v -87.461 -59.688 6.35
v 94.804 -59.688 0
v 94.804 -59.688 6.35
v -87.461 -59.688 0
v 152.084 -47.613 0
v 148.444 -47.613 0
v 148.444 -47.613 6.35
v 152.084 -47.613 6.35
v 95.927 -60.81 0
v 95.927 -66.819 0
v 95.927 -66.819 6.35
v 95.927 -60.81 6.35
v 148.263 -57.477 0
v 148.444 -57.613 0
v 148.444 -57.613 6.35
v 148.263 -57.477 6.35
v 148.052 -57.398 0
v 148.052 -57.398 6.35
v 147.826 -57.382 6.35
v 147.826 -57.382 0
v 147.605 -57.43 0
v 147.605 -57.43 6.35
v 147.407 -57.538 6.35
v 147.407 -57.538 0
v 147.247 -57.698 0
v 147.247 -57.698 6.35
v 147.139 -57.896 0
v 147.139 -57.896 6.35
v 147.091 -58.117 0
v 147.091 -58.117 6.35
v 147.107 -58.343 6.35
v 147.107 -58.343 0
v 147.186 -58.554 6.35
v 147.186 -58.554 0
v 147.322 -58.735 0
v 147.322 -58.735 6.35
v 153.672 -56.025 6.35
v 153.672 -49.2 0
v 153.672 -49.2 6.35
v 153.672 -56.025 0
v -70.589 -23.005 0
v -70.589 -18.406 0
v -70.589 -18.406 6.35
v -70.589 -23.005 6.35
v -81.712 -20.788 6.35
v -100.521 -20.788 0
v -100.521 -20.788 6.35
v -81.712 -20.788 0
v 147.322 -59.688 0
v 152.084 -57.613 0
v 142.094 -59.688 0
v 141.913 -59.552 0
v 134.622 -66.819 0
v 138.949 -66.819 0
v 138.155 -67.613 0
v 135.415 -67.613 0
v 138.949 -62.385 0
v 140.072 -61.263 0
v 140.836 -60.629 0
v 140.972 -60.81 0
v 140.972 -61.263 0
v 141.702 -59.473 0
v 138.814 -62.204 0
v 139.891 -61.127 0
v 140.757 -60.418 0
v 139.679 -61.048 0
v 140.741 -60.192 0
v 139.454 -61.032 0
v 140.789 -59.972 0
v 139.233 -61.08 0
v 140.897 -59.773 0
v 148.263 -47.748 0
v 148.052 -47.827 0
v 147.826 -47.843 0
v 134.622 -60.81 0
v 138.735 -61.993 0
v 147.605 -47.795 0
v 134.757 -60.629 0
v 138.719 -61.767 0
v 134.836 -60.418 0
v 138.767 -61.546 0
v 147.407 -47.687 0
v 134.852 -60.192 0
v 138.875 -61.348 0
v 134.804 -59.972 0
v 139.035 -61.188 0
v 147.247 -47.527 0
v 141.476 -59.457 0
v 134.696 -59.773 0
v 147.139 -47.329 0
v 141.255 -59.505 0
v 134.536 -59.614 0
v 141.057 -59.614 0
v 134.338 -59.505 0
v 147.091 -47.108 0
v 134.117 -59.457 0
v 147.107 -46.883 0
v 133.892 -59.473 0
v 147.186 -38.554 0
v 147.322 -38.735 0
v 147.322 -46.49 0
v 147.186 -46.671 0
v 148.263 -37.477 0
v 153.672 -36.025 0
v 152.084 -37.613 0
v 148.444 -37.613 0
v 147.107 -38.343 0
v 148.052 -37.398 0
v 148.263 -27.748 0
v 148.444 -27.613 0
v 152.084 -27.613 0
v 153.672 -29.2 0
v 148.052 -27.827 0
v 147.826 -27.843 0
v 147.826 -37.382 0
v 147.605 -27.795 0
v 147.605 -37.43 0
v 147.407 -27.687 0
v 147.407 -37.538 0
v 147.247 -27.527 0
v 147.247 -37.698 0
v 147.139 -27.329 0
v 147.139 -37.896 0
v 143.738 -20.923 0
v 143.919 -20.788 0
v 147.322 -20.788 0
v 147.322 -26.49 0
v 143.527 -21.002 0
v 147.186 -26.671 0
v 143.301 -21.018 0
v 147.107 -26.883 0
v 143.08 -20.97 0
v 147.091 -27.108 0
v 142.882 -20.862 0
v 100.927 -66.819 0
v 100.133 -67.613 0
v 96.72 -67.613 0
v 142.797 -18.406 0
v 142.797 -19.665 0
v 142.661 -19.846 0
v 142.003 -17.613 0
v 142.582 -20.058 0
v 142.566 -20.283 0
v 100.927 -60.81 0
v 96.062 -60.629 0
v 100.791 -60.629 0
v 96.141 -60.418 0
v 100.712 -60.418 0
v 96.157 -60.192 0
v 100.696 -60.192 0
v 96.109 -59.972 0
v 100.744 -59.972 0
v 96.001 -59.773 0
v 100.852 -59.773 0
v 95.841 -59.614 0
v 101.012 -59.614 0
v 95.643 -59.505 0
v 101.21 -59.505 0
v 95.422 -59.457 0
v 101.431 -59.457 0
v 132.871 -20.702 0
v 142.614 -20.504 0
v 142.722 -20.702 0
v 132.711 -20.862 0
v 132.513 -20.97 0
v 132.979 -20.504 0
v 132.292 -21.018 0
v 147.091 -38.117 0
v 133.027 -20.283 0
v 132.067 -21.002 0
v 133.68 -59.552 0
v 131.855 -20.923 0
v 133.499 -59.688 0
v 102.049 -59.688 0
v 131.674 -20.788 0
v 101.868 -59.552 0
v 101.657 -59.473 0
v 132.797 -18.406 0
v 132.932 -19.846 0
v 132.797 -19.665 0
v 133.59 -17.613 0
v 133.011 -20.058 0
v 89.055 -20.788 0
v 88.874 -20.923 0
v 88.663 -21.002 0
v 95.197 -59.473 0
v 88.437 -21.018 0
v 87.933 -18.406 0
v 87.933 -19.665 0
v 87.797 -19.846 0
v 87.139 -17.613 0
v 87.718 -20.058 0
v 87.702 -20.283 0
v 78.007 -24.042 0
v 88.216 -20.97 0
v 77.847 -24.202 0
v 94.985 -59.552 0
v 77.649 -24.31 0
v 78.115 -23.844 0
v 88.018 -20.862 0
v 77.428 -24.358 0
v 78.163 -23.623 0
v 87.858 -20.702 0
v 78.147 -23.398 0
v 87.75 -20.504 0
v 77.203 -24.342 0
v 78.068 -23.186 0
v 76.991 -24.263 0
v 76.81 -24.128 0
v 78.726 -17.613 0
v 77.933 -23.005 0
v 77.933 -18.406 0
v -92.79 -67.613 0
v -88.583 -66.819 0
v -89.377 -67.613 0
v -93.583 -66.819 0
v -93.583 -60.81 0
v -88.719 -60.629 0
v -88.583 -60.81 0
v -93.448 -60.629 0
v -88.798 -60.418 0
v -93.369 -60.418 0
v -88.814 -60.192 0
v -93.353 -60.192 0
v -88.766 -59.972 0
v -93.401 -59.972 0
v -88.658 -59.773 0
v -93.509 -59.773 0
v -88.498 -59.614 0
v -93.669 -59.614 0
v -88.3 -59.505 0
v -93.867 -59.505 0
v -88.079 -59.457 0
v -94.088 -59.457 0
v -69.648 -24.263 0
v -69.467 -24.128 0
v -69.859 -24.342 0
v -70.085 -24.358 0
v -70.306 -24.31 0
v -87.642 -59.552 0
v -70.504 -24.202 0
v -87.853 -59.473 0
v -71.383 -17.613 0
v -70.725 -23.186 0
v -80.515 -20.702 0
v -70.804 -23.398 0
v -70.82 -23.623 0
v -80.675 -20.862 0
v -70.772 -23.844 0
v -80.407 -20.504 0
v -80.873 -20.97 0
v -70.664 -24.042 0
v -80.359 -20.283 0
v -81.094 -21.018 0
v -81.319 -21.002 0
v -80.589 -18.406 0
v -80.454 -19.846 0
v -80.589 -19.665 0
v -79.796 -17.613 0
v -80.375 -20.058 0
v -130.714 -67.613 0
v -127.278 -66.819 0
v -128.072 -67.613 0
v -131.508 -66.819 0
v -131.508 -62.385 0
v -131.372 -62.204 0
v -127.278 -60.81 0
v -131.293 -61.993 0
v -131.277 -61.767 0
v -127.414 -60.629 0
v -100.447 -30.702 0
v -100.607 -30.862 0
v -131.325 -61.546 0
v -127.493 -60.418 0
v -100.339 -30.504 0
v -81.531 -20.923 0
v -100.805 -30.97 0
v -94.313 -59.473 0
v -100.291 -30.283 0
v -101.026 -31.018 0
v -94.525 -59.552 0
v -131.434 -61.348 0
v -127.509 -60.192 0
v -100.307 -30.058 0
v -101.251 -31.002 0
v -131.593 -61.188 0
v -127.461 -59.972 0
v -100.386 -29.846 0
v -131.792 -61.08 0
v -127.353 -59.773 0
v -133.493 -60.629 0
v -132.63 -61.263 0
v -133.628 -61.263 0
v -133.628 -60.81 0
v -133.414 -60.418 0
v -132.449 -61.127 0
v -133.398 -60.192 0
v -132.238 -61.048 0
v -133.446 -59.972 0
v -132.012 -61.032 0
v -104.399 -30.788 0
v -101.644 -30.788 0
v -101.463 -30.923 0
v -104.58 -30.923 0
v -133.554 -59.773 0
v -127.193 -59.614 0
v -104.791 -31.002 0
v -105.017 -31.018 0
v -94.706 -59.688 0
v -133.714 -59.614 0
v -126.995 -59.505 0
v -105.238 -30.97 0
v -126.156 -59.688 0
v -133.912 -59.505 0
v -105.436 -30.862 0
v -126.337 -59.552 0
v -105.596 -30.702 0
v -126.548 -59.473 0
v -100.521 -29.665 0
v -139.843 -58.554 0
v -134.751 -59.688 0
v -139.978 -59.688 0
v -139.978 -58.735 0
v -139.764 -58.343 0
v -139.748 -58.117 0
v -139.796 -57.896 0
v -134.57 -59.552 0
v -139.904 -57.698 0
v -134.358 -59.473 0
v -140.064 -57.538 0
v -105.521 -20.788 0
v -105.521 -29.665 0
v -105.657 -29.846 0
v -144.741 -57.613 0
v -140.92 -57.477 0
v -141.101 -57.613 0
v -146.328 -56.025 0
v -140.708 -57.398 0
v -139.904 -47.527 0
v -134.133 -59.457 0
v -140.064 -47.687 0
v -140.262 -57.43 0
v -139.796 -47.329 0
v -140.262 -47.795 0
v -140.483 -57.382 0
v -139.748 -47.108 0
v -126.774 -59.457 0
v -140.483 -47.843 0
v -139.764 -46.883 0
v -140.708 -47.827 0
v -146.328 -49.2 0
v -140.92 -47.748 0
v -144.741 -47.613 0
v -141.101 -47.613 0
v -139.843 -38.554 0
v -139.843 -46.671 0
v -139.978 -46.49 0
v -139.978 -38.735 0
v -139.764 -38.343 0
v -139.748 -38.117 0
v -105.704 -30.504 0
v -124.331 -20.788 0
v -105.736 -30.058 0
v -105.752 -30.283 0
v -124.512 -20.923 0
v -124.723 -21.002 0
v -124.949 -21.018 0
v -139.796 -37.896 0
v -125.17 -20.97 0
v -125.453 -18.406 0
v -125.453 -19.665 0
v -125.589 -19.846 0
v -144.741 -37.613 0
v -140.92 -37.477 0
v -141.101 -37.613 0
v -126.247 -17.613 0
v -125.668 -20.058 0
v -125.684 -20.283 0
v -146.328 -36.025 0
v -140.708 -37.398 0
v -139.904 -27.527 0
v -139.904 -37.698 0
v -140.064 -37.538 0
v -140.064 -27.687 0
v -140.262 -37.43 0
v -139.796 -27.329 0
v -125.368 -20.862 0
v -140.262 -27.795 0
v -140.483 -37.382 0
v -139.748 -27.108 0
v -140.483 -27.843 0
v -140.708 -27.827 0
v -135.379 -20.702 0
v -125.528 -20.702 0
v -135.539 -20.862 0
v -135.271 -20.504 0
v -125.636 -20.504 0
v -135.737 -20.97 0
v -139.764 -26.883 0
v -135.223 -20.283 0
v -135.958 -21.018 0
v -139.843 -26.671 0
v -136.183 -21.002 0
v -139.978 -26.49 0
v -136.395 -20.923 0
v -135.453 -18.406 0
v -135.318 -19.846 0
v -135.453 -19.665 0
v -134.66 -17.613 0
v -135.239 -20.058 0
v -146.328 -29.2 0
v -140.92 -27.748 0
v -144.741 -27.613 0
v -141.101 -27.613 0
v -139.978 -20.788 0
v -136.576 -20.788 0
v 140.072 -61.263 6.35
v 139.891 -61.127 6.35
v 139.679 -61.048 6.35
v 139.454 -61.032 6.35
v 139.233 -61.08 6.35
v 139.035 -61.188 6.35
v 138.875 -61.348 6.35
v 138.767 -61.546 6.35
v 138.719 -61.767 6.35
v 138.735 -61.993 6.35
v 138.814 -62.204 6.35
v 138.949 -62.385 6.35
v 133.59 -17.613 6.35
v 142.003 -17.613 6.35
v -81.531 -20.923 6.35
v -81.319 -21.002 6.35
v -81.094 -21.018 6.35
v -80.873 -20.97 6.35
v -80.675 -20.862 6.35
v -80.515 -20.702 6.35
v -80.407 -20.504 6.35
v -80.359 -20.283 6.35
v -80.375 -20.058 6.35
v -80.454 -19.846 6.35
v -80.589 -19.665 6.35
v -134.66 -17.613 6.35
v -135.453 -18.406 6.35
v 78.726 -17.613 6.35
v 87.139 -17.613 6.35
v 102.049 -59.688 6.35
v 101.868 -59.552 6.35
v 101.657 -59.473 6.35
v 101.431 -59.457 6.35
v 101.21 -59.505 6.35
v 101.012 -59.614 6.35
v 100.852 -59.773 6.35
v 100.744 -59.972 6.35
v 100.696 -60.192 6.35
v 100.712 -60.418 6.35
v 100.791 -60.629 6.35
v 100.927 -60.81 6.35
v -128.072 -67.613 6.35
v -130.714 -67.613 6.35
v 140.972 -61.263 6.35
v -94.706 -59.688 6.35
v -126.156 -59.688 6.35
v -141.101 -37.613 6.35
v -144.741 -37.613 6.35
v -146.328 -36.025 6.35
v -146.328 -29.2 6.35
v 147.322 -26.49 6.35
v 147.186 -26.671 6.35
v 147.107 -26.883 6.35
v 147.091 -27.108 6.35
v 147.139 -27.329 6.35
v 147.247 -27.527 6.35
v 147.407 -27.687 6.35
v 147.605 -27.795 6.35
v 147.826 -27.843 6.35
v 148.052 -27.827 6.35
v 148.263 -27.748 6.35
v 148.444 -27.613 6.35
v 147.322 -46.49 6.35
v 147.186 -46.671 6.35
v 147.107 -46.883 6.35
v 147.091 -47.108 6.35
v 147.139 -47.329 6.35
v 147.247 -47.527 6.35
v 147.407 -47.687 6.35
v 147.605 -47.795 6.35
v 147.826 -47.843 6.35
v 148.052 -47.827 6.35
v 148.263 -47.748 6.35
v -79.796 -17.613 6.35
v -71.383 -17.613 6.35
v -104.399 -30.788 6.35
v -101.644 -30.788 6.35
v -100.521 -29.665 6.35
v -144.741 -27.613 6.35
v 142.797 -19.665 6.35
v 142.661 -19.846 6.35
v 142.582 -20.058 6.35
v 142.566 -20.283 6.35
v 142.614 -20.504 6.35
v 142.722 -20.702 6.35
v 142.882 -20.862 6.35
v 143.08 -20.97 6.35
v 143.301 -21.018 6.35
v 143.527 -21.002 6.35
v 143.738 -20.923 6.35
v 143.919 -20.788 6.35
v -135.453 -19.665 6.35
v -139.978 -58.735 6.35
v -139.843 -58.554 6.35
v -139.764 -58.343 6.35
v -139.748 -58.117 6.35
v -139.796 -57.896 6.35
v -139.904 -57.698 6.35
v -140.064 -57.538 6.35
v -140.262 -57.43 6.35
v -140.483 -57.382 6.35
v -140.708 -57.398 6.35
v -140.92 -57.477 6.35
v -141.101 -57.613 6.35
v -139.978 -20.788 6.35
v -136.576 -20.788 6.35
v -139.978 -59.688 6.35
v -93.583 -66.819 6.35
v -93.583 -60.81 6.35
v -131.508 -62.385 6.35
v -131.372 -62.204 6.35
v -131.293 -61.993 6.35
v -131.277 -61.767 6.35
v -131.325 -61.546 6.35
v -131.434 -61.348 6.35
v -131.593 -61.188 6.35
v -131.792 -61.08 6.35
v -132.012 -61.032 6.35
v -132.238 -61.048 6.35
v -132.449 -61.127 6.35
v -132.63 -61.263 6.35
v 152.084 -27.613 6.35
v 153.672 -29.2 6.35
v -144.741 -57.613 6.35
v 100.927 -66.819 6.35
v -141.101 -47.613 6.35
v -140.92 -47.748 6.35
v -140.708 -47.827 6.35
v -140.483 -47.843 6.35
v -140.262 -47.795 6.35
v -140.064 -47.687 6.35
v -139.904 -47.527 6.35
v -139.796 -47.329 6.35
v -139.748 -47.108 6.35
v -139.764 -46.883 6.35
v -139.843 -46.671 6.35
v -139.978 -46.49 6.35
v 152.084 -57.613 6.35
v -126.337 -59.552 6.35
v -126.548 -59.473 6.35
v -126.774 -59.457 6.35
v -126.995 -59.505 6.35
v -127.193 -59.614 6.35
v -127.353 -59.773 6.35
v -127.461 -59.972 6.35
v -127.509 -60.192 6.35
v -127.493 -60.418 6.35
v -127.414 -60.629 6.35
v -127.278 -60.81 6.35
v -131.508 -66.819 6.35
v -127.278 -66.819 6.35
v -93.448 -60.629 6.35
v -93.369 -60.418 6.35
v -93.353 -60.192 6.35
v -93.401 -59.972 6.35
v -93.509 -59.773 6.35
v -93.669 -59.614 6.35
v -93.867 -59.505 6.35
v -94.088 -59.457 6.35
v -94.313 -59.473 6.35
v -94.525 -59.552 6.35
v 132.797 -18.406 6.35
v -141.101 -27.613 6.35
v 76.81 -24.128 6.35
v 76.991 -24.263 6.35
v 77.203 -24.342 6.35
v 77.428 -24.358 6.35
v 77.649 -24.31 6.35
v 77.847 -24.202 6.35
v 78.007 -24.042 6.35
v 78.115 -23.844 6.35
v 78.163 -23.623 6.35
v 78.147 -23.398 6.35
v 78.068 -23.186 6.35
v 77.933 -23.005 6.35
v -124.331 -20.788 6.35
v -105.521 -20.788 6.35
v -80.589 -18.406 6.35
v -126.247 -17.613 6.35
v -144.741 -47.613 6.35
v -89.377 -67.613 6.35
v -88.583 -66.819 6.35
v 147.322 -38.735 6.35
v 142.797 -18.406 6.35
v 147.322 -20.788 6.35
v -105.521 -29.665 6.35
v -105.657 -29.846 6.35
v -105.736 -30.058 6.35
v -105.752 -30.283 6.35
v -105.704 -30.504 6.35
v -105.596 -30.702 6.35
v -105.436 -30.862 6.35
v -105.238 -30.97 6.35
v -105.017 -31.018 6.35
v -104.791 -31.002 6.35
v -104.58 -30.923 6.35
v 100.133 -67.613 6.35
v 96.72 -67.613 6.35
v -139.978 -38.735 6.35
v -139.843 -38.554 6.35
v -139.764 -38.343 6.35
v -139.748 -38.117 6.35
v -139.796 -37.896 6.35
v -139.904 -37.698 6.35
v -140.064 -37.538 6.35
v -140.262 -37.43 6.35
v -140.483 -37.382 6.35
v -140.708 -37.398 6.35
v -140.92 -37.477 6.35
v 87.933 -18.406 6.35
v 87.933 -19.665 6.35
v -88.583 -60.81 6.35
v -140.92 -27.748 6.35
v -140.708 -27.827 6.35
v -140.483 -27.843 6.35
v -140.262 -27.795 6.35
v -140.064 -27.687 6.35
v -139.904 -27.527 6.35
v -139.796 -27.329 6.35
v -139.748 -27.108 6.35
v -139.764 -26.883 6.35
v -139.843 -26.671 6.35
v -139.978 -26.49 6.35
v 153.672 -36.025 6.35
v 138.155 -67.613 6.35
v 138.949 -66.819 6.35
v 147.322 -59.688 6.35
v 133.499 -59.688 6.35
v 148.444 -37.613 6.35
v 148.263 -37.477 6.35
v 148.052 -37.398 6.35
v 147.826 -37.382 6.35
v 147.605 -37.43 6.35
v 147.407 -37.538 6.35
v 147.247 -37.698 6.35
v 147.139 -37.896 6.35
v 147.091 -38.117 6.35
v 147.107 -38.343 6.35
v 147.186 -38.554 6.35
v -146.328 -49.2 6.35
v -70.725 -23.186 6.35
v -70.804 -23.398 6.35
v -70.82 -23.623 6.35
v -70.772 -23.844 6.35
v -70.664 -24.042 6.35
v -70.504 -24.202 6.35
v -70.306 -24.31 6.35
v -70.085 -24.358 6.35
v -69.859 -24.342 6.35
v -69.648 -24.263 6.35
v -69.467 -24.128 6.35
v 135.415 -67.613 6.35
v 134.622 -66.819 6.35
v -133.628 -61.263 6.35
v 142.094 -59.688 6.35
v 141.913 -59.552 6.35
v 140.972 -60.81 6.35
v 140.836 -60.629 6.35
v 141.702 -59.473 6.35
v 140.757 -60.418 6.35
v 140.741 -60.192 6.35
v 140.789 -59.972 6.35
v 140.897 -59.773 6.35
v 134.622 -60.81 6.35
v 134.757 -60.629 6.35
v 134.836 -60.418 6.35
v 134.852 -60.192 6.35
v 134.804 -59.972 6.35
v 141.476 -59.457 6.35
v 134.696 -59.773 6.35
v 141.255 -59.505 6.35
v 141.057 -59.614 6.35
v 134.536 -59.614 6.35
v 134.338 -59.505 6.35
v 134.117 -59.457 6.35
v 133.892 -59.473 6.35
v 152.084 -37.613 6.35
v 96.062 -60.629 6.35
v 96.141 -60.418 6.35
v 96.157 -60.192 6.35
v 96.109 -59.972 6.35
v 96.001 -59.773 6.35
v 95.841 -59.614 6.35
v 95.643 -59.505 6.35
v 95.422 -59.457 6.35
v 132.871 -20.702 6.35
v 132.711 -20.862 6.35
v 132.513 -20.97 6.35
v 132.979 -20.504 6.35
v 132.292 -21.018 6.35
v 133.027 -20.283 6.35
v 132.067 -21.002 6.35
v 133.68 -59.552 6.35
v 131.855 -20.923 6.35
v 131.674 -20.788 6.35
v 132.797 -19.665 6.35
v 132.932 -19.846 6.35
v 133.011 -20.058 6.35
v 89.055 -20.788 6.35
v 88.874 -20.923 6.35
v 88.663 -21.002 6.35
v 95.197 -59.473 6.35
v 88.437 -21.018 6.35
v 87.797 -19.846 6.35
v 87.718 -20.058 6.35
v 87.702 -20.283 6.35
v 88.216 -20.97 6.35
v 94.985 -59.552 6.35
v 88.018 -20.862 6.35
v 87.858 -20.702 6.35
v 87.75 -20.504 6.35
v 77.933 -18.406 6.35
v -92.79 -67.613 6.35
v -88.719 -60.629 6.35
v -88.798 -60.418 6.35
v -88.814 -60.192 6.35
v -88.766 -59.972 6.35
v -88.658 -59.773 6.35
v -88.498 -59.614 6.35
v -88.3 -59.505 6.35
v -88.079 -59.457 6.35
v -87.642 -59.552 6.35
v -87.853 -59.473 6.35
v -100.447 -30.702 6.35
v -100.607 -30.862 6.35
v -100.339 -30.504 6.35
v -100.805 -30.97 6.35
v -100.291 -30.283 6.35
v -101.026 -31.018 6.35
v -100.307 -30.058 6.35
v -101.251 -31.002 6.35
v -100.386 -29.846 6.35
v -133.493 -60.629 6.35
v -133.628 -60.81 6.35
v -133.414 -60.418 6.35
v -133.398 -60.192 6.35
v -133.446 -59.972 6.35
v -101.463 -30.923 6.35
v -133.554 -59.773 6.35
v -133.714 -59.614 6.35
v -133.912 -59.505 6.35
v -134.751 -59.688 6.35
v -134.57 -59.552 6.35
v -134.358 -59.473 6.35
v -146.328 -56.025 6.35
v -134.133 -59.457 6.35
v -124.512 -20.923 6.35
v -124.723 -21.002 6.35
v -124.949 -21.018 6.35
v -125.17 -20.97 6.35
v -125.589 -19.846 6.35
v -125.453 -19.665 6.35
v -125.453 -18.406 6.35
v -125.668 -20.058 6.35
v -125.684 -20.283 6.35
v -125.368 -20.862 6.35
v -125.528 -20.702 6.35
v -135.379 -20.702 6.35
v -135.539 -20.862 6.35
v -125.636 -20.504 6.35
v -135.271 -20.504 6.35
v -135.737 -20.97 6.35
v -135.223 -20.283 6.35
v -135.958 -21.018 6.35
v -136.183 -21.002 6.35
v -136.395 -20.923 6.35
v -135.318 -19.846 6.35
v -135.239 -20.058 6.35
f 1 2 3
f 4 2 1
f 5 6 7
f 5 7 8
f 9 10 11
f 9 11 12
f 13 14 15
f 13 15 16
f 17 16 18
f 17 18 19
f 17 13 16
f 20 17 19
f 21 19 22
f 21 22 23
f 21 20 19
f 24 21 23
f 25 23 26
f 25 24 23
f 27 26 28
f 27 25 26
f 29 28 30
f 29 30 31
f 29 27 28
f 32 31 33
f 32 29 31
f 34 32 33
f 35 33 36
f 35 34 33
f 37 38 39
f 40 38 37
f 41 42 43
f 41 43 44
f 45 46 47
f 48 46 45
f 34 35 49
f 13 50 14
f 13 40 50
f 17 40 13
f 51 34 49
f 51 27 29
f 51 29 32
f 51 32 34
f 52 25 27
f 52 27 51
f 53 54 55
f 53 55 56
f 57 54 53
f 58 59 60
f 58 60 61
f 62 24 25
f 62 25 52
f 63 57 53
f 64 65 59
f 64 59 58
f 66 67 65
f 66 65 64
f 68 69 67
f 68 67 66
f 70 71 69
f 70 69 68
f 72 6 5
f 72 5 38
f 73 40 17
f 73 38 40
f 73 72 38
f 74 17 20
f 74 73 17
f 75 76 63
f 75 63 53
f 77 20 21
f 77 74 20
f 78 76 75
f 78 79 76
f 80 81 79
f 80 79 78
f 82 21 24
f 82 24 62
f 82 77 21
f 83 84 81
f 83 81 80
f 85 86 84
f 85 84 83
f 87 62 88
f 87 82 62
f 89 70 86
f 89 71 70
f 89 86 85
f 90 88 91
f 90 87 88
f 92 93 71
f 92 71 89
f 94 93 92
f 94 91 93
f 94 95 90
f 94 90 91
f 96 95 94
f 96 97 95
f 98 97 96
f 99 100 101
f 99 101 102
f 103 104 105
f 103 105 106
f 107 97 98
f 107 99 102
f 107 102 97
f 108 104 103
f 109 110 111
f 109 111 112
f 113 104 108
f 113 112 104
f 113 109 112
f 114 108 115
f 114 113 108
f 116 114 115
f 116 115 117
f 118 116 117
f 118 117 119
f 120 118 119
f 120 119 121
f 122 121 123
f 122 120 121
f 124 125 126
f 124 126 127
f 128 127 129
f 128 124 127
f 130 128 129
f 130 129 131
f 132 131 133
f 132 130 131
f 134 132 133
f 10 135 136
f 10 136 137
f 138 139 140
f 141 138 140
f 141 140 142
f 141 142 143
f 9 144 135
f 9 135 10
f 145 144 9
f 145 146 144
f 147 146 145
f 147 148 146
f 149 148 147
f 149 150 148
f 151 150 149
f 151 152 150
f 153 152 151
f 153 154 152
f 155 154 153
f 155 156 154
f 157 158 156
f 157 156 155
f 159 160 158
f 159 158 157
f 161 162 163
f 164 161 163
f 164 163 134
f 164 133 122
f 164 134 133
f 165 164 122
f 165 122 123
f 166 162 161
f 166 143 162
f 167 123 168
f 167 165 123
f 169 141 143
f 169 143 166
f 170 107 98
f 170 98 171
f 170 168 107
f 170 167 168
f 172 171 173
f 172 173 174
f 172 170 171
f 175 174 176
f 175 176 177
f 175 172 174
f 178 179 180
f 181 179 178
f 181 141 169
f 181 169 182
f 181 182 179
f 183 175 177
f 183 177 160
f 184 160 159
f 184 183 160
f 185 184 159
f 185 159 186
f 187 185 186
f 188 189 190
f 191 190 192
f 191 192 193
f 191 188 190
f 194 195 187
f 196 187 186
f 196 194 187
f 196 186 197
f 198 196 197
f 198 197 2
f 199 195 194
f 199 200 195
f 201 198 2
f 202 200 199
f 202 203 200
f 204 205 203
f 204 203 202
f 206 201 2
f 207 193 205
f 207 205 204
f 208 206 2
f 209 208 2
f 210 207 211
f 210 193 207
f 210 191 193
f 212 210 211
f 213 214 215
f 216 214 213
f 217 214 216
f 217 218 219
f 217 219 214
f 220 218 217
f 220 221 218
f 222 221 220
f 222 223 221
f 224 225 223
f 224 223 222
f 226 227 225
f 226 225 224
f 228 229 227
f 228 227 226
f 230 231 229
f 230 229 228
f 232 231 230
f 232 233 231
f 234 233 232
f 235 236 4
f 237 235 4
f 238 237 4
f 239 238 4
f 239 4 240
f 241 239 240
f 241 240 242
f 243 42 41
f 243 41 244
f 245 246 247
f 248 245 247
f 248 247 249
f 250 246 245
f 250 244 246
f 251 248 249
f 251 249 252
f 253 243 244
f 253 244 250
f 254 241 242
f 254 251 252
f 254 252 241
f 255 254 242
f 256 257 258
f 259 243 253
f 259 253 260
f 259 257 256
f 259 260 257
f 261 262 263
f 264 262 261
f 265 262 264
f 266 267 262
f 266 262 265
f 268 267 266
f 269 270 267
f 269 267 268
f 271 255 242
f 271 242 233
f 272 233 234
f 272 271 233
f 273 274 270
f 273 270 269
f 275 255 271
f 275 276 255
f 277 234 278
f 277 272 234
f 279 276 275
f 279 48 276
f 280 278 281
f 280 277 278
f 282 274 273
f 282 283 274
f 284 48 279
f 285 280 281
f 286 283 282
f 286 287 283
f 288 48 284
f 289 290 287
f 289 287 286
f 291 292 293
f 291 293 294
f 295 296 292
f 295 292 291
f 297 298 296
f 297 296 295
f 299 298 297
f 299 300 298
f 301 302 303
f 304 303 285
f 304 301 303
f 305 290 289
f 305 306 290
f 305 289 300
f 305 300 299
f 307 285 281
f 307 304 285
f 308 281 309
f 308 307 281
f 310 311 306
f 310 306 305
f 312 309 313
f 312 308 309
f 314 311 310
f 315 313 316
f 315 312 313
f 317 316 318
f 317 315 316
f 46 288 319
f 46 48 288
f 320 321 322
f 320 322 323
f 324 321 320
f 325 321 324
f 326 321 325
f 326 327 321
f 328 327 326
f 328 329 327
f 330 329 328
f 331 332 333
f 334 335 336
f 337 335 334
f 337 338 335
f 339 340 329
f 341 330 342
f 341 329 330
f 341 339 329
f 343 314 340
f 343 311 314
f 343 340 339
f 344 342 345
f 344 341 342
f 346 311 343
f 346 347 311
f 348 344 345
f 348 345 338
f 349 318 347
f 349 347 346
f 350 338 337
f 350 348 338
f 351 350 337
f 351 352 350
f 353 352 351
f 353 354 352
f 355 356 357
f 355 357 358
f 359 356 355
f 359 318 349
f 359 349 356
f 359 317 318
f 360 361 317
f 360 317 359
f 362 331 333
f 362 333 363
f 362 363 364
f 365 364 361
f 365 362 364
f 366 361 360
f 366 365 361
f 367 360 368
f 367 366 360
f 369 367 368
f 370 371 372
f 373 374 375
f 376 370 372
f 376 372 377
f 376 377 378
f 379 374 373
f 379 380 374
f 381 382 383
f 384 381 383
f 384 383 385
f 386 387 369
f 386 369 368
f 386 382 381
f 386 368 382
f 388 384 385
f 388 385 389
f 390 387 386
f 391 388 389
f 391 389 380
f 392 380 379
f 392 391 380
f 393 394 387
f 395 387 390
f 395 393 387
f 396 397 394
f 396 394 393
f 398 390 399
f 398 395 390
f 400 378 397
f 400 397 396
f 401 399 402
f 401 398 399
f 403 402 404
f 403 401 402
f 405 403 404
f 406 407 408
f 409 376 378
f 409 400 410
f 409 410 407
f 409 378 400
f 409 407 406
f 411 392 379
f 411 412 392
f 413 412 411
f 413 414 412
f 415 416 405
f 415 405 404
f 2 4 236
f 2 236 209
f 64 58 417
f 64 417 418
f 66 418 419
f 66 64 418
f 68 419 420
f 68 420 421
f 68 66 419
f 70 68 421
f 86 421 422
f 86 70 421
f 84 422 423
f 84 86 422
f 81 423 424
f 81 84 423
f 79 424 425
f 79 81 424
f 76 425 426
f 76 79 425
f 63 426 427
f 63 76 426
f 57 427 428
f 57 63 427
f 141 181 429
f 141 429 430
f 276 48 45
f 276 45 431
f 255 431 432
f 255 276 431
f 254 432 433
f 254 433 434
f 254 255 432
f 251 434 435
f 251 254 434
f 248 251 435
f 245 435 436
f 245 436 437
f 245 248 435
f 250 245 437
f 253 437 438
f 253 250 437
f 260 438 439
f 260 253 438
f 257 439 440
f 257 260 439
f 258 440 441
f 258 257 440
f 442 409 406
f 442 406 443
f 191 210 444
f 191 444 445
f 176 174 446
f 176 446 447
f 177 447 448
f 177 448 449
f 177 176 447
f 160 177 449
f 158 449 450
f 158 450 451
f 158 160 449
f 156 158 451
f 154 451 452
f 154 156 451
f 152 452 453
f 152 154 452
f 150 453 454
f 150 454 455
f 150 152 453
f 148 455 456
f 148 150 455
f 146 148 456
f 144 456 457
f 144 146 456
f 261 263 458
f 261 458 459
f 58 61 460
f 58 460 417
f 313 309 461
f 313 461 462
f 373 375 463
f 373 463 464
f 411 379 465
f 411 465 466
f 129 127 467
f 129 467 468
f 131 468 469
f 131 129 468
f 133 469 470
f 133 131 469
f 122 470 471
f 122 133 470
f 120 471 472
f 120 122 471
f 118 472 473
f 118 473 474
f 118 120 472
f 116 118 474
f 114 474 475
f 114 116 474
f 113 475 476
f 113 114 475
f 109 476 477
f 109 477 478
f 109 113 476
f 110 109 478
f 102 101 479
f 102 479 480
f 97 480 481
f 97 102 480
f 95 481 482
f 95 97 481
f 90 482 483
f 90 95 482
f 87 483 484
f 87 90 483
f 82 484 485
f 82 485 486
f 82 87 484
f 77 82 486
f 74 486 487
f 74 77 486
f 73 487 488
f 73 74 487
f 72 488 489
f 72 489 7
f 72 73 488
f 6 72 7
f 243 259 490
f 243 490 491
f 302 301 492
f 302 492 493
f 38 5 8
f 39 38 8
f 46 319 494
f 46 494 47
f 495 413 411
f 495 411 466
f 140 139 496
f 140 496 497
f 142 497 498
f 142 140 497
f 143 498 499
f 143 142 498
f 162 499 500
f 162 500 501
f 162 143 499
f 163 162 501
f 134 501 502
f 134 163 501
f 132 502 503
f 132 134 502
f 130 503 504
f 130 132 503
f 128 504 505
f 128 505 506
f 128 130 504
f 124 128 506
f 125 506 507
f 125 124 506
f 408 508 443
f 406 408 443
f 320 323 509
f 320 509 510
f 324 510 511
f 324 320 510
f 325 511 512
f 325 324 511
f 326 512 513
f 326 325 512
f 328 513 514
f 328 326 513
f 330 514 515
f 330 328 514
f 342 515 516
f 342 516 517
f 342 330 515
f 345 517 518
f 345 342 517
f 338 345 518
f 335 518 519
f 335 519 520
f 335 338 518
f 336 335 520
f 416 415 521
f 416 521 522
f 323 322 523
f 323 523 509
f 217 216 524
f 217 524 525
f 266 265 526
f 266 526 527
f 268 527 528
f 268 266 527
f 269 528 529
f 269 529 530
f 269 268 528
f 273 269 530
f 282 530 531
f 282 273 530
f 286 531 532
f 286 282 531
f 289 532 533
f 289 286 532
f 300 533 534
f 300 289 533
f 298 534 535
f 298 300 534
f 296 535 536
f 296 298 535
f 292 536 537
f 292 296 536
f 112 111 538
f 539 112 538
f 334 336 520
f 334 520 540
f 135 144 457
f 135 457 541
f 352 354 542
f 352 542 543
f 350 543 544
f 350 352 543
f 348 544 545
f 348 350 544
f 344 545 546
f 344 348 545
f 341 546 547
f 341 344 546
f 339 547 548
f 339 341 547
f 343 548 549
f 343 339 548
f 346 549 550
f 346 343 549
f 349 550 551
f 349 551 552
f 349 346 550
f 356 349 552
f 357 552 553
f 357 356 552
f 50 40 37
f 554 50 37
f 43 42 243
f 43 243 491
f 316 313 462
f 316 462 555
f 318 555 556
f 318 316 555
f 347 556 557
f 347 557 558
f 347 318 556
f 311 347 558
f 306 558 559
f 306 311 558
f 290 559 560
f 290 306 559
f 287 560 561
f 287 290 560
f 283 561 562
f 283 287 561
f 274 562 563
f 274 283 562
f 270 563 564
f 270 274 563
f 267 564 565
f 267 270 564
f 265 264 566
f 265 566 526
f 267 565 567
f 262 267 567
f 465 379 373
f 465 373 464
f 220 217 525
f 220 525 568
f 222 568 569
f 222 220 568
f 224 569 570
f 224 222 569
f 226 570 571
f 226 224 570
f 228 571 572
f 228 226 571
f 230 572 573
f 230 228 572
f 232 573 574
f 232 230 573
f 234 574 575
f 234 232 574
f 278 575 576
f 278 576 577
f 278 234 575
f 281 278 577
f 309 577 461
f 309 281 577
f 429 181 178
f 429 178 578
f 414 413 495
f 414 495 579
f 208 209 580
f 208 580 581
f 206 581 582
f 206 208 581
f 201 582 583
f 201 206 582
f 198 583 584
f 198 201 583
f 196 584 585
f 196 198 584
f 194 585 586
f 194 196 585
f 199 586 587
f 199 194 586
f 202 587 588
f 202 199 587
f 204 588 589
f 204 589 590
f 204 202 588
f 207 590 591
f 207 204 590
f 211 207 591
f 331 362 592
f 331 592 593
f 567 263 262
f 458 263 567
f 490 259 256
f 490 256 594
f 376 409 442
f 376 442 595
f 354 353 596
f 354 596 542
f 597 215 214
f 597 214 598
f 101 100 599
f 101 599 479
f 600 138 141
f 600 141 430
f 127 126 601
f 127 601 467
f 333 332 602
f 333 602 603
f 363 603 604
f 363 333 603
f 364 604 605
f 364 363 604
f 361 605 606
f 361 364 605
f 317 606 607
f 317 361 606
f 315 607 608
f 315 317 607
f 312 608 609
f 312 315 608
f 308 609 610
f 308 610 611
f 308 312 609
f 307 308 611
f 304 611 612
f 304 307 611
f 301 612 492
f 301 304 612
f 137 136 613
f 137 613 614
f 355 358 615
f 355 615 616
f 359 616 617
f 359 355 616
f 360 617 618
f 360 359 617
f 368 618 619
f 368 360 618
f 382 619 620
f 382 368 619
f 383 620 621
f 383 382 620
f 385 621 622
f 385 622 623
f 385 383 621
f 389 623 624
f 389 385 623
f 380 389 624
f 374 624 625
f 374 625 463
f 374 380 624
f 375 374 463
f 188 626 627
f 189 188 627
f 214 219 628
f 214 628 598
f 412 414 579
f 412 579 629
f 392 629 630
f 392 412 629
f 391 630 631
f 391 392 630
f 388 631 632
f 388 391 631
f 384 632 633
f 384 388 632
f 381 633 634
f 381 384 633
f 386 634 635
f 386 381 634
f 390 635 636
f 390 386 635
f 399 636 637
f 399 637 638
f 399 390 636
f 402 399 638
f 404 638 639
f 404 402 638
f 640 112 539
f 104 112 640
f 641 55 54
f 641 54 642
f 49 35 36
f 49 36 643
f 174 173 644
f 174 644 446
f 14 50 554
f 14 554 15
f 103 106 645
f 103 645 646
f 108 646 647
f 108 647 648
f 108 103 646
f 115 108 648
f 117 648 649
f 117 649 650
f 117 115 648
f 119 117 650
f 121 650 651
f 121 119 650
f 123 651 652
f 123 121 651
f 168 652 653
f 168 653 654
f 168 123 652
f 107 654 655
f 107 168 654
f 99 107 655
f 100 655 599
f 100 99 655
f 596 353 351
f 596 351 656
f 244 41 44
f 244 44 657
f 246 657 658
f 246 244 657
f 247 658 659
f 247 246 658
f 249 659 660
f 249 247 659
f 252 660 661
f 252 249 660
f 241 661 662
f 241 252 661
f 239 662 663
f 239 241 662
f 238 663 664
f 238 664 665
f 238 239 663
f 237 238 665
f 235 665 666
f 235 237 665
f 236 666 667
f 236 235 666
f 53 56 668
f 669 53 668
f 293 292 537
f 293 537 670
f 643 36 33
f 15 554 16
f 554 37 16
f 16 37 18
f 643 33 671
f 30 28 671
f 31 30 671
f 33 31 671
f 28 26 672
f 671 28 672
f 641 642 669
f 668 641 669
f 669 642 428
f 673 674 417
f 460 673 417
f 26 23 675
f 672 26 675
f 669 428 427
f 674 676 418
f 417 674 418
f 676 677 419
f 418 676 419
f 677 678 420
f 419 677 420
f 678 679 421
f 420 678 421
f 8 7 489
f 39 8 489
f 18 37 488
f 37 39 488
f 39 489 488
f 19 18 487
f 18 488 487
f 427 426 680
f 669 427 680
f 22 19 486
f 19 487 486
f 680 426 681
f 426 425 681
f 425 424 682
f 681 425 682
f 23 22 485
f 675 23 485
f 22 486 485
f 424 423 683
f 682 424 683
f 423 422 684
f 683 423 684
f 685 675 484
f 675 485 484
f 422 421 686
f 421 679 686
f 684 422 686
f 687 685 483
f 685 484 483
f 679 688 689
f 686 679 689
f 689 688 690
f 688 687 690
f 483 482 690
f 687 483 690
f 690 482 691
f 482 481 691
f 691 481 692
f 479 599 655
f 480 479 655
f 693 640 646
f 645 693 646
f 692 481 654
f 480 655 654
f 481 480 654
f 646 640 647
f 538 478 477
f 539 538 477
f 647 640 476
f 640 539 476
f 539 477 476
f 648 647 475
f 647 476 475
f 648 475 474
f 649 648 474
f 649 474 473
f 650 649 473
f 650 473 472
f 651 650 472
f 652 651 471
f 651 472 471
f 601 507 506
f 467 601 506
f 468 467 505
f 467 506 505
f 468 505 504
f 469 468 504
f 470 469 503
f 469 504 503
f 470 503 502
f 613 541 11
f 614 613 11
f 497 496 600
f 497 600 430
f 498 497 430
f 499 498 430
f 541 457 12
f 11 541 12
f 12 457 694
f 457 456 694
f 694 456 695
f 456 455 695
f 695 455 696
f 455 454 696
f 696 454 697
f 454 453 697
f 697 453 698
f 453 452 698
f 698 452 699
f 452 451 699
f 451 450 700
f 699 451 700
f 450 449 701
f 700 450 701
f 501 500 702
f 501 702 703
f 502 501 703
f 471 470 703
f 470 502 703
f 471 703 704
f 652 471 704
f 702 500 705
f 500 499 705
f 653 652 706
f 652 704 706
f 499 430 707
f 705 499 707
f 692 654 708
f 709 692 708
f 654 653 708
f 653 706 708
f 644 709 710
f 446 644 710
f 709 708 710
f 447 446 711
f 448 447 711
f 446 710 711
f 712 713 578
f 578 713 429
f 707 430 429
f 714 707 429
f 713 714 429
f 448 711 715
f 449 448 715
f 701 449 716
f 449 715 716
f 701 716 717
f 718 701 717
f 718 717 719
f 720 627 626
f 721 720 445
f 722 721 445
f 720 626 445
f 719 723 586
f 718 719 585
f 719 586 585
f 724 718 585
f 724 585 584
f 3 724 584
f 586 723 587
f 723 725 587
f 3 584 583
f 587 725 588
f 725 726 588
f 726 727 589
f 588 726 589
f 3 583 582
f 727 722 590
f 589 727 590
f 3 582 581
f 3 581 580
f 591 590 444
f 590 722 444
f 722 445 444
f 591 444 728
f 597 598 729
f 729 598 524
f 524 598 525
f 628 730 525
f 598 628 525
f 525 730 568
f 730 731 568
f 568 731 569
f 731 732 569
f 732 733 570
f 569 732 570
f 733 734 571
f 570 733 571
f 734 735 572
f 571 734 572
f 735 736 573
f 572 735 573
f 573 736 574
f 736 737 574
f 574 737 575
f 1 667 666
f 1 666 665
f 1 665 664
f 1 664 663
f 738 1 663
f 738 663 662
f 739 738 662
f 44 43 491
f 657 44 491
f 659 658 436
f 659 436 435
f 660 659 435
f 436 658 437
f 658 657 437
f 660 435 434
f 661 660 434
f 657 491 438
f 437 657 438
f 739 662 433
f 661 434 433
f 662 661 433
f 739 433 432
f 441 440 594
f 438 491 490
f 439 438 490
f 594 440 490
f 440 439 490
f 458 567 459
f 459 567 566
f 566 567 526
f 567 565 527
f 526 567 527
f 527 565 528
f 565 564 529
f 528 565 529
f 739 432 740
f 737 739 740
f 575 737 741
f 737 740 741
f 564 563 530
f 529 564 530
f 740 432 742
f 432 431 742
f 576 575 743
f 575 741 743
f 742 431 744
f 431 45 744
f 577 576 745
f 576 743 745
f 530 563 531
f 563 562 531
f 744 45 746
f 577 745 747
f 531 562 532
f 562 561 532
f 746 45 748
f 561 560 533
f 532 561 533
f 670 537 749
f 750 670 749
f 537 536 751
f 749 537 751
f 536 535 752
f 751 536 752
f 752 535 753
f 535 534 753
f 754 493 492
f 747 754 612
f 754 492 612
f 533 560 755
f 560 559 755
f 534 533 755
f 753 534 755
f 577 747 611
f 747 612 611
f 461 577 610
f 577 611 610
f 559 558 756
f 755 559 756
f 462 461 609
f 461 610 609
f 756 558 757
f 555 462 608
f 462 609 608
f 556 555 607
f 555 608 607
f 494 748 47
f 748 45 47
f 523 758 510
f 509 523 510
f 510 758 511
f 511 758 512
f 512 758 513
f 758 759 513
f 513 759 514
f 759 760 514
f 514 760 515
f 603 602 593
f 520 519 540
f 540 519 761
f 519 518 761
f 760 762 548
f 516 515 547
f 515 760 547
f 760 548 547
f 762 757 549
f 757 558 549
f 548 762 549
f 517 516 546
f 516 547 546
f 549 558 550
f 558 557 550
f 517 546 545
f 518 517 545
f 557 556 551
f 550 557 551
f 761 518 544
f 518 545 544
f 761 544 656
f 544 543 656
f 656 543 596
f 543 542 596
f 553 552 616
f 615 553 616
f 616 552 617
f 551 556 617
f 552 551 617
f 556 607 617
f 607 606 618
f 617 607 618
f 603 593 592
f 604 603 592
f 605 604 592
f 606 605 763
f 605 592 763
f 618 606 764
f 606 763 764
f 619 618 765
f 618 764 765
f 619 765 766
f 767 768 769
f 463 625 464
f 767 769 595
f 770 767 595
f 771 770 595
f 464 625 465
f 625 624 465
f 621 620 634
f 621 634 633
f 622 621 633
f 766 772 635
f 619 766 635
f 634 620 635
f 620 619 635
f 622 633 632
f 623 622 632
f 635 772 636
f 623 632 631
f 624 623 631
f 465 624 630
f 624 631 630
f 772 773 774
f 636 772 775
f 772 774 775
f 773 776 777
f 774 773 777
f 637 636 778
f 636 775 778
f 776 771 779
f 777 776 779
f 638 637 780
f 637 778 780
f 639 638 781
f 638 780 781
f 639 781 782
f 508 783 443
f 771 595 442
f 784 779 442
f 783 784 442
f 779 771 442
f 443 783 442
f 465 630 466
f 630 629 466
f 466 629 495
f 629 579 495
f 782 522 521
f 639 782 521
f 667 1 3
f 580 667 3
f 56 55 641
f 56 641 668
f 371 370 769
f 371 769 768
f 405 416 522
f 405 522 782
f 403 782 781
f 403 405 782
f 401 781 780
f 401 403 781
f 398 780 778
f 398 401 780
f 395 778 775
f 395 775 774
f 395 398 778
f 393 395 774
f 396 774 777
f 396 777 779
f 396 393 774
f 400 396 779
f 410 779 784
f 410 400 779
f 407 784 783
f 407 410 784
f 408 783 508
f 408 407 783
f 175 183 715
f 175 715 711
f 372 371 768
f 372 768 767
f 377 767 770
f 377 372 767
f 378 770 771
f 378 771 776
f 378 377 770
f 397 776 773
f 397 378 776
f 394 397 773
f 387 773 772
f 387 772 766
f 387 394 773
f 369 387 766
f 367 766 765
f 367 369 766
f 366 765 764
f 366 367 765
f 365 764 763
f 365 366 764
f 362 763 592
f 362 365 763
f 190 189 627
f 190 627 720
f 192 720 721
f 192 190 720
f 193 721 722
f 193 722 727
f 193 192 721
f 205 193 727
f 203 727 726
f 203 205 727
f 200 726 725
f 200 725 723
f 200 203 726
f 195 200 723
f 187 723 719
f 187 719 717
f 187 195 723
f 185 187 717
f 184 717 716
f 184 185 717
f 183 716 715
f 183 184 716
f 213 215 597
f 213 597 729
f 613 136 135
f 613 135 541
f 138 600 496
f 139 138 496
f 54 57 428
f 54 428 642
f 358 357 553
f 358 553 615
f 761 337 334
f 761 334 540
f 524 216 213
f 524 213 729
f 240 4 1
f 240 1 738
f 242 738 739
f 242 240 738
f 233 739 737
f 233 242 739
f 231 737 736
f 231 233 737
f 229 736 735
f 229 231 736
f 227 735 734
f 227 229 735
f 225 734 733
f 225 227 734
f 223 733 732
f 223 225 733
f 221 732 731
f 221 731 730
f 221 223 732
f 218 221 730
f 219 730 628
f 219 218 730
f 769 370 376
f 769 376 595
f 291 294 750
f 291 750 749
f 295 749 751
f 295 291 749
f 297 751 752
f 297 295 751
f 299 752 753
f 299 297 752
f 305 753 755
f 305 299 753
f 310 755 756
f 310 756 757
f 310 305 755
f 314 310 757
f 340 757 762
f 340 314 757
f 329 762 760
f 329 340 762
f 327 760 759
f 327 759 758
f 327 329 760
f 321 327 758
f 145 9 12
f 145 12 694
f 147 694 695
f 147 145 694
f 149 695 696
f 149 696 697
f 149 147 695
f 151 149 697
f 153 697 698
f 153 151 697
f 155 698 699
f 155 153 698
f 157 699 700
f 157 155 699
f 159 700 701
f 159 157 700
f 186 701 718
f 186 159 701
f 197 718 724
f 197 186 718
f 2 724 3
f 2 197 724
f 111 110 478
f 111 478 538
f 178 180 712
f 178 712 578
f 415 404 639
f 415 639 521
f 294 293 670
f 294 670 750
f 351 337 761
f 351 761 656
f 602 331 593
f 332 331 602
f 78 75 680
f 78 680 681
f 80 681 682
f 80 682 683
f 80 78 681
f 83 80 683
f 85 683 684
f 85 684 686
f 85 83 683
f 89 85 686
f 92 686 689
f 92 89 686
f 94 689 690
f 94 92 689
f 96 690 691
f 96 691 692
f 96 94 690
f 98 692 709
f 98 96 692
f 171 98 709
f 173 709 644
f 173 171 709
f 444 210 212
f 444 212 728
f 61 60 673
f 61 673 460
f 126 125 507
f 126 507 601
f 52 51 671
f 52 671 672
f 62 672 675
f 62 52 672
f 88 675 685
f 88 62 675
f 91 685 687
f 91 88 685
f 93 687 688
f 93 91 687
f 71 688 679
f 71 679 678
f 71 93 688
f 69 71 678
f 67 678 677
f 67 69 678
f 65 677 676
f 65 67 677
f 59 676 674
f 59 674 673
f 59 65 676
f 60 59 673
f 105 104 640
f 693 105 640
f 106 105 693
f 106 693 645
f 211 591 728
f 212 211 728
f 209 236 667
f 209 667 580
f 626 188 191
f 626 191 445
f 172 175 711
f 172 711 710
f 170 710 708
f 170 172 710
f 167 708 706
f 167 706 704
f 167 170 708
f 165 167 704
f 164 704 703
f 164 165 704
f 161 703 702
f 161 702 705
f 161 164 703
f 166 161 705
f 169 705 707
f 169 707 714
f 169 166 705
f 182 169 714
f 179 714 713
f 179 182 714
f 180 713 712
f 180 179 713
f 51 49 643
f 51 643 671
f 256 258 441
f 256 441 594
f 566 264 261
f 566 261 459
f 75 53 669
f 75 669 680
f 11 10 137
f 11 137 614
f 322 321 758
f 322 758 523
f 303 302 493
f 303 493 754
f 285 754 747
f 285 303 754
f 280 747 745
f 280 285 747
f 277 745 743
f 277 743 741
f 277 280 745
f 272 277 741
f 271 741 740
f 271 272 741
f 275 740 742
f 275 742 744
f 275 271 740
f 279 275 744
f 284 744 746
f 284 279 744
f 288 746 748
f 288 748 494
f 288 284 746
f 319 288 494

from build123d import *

# Parameters (mm, degrees)
BOSS_EXTRUDE1_DEPTH = 6.35
CHAMFER1_SIZE       = 0.79375
CHAMFER2_SIZE       = 1.5875


with BuildPart() as part:
    # Sketch1 → Boss-Extrude1 (new body)
    with BuildSketch(Plane.XY):
        with BuildLine():
            Line((134.621545702, -67.612541882), (134.621545702, -60.810273898))
            ThreePointArc((134.621545702, -60.810273898), (134.621545702, -59.687741882), (133.499013687, -59.687741882))
            Line((133.499013687, -59.687741882), (102.049077718, -59.687741882))
            ThreePointArc((102.049077718, -59.687741882), (100.926545702, -59.687741882), (100.926545702, -60.810273898))
            Line((100.926545702, -60.810273898), (100.926545702, -67.612541882))
            Line((100.926545702, -67.612541882), (95.926545702, -67.612541882))
            Line((95.926545702, -67.612541882), (95.926545702, -60.810273898))
            ThreePointArc((95.926545702, -60.810273898), (95.926545702, -59.687741882), (94.804013687, -59.687741882))
            Line((94.804013687, -59.687741882), (-87.460922281, -59.687741882))
            ThreePointArc((-87.460922281, -59.687741882), (-88.583454296, -59.687741882), (-88.583454296, -60.810273898))
            Line((-88.583454296, -60.810273898), (-88.583454296, -67.612541882))
            Line((-88.583454296, -67.612541882), (-93.583454296, -67.612541882))
            Line((-93.583454296, -67.612541882), (-93.583454296, -60.810273898))
            ThreePointArc((-93.583454296, -60.810273898), (-93.583454296, -59.687741882), (-94.705986312, -59.687741882))
            Line((-94.705986312, -59.687741882), (-126.155922281, -59.687741882))
            ThreePointArc((-126.155922281, -59.687741882), (-127.278454296, -59.687741882), (-127.278454296, -60.810273898))
            Line((-127.278454296, -60.810273898), (-127.278454296, -67.612541882))
            Line((-127.278454296, -67.612541882), (-131.507694323, -67.612541882))
            Line((-131.507694323, -67.612541882), (-131.507694323, -62.385073898))
            ThreePointArc((-131.507694323, -62.385073898), (-131.507694323, -61.262541882), (-132.630226338, -61.262541882))
            Line((-132.630226338, -61.262541882), (-133.628454296, -61.262541882))
            Line((-133.628454296, -61.262541882), (-133.628454296, -60.810273898))
            ThreePointArc((-133.628454296, -60.810273898), (-133.628454296, -59.687741882), (-134.750986312, -59.687741882))
            Line((-134.750986312, -59.687741882), (-139.978454296, -59.687741882))
            Line((-139.978454296, -59.687741882), (-139.978454296, -58.735073898))
            ThreePointArc((-139.978454296, -58.735073898), (-139.978454296, -57.612541882), (-141.100986312, -57.612541882))
            Line((-141.100986312, -57.612541882), (-146.328454296, -57.612541882))
            Line((-146.328454296, -57.612541882), (-146.328454296, -47.612541882))
            Line((-146.328454296, -47.612541882), (-141.100986312, -47.612541882))
            ThreePointArc((-141.100986312, -47.612541882), (-139.978454296, -47.612541882), (-139.978454296, -46.490009867))
            Line((-139.978454296, -46.490009867), (-139.978454296, -38.735073898))
            ThreePointArc((-139.978454296, -38.735073898), (-139.978454296, -37.612541882), (-141.100986312, -37.612541882))
            Line((-141.100986312, -37.612541882), (-146.328454296, -37.612541882))
            Line((-146.328454296, -37.612541882), (-146.328454296, -27.612541882))
            Line((-146.328454296, -27.612541882), (-141.100986312, -27.612541882))
            ThreePointArc((-141.100986312, -27.612541882), (-139.978454296, -27.612541882), (-139.978454296, -26.490009867))
            Line((-139.978454296, -26.490009867), (-139.978454296, -20.787541882))
            Line((-139.978454296, -20.787541882), (-136.575986312, -20.787541882))
            ThreePointArc((-136.575986312, -20.787541882), (-135.453454296, -20.787541882), (-135.453454296, -19.665009867))
            Line((-135.453454296, -19.665009867), (-135.453454296, -17.612541882))
            Line((-135.453454296, -17.612541882), (-125.453454296, -17.612541882))
            Line((-125.453454296, -17.612541882), (-125.453454296, -19.665009867))
            ThreePointArc((-125.453454296, -19.665009867), (-125.453454296, -20.787541882), (-124.330922281, -20.787541882))
            Line((-124.330922281, -20.787541882), (-105.521454296, -20.787541882))
            Line((-105.521454296, -20.787541882), (-105.521454296, -29.665009867))
            ThreePointArc((-105.521454296, -29.665009867), (-105.521454296, -30.787541882), (-104.398922281, -30.787541882))
            Line((-104.398922281, -30.787541882), (-101.643986312, -30.787541882))
            ThreePointArc((-101.643986312, -30.787541882), (-100.521454296, -30.787541882), (-100.521454296, -29.665009867))
            Line((-100.521454296, -29.665009867), (-100.521454296, -20.787541882))
            Line((-100.521454296, -20.787541882), (-81.711986312, -20.787541882))
            ThreePointArc((-81.711986312, -20.787541882), (-80.589454296, -20.787541882), (-80.589454296, -19.665009867))
            Line((-80.589454296, -19.665009867), (-80.589454296, -17.612541882))
            Line((-80.589454296, -17.612541882), (-70.589454296, -17.612541882))
            Line((-70.589454296, -17.612541882), (-70.589454296, -23.005209867))
            ThreePointArc((-70.589454296, -23.005209867), (-70.589454296, -24.127741882), (-69.466922281, -24.127741882))
            Line((-69.466922281, -24.127741882), (76.810013687, -24.127741882))
            ThreePointArc((76.810013687, -24.127741882), (77.932545702, -24.127741882), (77.932545702, -23.005209867))
            Line((77.932545702, -23.005209867), (77.932545702, -17.612541882))
            Line((77.932545702, -17.612541882), (87.932545702, -17.612541882))
            Line((87.932545702, -17.612541882), (87.932545702, -19.665009867))
            ThreePointArc((87.932545702, -19.665009867), (87.932545702, -20.787541882), (89.055077718, -20.787541882))
            Line((89.055077718, -20.787541882), (131.674013687, -20.787541882))
            ThreePointArc((131.674013687, -20.787541882), (132.796545702, -20.787541882), (132.796545702, -19.665009867))
            Line((132.796545702, -19.665009867), (132.796545702, -17.612541882))
            Line((132.796545702, -17.612541882), (142.796545702, -17.612541882))
            Line((142.796545702, -17.612541882), (142.796545702, -19.665009867))
            ThreePointArc((142.796545702, -19.665009867), (142.796545702, -20.787541882), (143.919077718, -20.787541882))
            Line((143.919077718, -20.787541882), (147.321545702, -20.787541882))
            Line((147.321545702, -20.787541882), (147.321545702, -26.490009867))
            ThreePointArc((147.321545702, -26.490009867), (147.321545702, -27.612541882), (148.444077718, -27.612541882))
            Line((148.444077718, -27.612541882), (153.671545702, -27.612541882))
            Line((153.671545702, -27.612541882), (153.671545702, -37.612541882))
            Line((153.671545702, -37.612541882), (148.444077718, -37.612541882))
            ThreePointArc((148.444077718, -37.612541882), (147.321545702, -37.612541882), (147.321545702, -38.735073898))
            Line((147.321545702, -38.735073898), (147.321545702, -46.490009867))
            ThreePointArc((147.321545702, -46.490009867), (147.321545702, -47.612541882), (148.444077718, -47.612541882))
            Line((148.444077718, -47.612541882), (153.671545702, -47.612541882))
            Line((153.671545702, -47.612541882), (153.671545702, -57.612541882))
            Line((153.671545702, -57.612541882), (148.444077718, -57.612541882))
            ThreePointArc((148.444077718, -57.612541882), (147.321545702, -57.612541882), (147.321545702, -58.735073898))
            Line((147.321545702, -58.735073898), (147.321545702, -59.687741882))
            Line((147.321545702, -59.687741882), (142.094077718, -59.687741882))
            ThreePointArc((142.094077718, -59.687741882), (140.971545702, -59.687741882), (140.971545702, -60.810273898))
            Line((140.971545702, -60.810273898), (140.971545702, -61.262541882))
            Line((140.971545702, -61.262541882), (140.071500685, -61.262541882))
            ThreePointArc((140.071500685, -61.262541882), (138.948968669, -61.262541882), (138.948968669, -62.385073898))
            Line((138.948968669, -62.385073898), (138.948968669, -67.612541882))
            Line((138.948968669, -67.612541882), (134.621545702, -67.612541882))
        make_face()
    extrude(amount=BOSS_EXTRUDE1_DEPTH)

    # Chamfer1
    chamfer1_edges = [part.edges().sort_by_distance(p)[0] for p in [
        (100.926545702, -67.612541882, 3.175),
        (95.926545702, -67.612541882, 3.175),
        (-88.583454296, -67.612541882, 3.175),
        (-93.583454296, -67.612541882, 3.175),
        (-127.278454296, -67.612541882, 3.175),
        (-131.507694323, -67.612541882, 3.175),
        (-135.453454296, -17.612541882, 3.175),
        (-125.453454296, -17.612541882, 3.175),
        (-80.589454296, -17.612541882, 3.175),
        (-70.589454296, -17.612541882, 3.175),
        (77.932545702, -17.612541882, 3.175),
        (87.932545702, -17.612541882, 3.175),
        (132.796545702, -17.612541882, 3.175),
        (142.796545702, -17.612541882, 3.175),
        (138.948968669, -67.612541882, 3.175),
        (134.621545702, -67.612541882, 3.175),
    ]]
    chamfer(chamfer1_edges, length=CHAMFER1_SIZE)

    # Chamfer2
    chamfer2_edges = [part.edges().sort_by_distance(p)[0] for p in [
        (-146.328454296, -57.612541882, 3.175),
        (-146.328454296, -47.612541882, 3.175),
        (-146.328454296, -37.612541882, 3.175),
        (-146.328454296, -27.612541882, 3.175),
        (153.671545702, -27.612541882, 3.175),
        (153.671545702, -37.612541882, 3.175),
        (153.671545702, -47.612541882, 3.175),
        (153.671545702, -57.612541882, 3.175),
    ]]
    chamfer(chamfer2_edges, length=CHAMFER2_SIZE)


solid = part.part
